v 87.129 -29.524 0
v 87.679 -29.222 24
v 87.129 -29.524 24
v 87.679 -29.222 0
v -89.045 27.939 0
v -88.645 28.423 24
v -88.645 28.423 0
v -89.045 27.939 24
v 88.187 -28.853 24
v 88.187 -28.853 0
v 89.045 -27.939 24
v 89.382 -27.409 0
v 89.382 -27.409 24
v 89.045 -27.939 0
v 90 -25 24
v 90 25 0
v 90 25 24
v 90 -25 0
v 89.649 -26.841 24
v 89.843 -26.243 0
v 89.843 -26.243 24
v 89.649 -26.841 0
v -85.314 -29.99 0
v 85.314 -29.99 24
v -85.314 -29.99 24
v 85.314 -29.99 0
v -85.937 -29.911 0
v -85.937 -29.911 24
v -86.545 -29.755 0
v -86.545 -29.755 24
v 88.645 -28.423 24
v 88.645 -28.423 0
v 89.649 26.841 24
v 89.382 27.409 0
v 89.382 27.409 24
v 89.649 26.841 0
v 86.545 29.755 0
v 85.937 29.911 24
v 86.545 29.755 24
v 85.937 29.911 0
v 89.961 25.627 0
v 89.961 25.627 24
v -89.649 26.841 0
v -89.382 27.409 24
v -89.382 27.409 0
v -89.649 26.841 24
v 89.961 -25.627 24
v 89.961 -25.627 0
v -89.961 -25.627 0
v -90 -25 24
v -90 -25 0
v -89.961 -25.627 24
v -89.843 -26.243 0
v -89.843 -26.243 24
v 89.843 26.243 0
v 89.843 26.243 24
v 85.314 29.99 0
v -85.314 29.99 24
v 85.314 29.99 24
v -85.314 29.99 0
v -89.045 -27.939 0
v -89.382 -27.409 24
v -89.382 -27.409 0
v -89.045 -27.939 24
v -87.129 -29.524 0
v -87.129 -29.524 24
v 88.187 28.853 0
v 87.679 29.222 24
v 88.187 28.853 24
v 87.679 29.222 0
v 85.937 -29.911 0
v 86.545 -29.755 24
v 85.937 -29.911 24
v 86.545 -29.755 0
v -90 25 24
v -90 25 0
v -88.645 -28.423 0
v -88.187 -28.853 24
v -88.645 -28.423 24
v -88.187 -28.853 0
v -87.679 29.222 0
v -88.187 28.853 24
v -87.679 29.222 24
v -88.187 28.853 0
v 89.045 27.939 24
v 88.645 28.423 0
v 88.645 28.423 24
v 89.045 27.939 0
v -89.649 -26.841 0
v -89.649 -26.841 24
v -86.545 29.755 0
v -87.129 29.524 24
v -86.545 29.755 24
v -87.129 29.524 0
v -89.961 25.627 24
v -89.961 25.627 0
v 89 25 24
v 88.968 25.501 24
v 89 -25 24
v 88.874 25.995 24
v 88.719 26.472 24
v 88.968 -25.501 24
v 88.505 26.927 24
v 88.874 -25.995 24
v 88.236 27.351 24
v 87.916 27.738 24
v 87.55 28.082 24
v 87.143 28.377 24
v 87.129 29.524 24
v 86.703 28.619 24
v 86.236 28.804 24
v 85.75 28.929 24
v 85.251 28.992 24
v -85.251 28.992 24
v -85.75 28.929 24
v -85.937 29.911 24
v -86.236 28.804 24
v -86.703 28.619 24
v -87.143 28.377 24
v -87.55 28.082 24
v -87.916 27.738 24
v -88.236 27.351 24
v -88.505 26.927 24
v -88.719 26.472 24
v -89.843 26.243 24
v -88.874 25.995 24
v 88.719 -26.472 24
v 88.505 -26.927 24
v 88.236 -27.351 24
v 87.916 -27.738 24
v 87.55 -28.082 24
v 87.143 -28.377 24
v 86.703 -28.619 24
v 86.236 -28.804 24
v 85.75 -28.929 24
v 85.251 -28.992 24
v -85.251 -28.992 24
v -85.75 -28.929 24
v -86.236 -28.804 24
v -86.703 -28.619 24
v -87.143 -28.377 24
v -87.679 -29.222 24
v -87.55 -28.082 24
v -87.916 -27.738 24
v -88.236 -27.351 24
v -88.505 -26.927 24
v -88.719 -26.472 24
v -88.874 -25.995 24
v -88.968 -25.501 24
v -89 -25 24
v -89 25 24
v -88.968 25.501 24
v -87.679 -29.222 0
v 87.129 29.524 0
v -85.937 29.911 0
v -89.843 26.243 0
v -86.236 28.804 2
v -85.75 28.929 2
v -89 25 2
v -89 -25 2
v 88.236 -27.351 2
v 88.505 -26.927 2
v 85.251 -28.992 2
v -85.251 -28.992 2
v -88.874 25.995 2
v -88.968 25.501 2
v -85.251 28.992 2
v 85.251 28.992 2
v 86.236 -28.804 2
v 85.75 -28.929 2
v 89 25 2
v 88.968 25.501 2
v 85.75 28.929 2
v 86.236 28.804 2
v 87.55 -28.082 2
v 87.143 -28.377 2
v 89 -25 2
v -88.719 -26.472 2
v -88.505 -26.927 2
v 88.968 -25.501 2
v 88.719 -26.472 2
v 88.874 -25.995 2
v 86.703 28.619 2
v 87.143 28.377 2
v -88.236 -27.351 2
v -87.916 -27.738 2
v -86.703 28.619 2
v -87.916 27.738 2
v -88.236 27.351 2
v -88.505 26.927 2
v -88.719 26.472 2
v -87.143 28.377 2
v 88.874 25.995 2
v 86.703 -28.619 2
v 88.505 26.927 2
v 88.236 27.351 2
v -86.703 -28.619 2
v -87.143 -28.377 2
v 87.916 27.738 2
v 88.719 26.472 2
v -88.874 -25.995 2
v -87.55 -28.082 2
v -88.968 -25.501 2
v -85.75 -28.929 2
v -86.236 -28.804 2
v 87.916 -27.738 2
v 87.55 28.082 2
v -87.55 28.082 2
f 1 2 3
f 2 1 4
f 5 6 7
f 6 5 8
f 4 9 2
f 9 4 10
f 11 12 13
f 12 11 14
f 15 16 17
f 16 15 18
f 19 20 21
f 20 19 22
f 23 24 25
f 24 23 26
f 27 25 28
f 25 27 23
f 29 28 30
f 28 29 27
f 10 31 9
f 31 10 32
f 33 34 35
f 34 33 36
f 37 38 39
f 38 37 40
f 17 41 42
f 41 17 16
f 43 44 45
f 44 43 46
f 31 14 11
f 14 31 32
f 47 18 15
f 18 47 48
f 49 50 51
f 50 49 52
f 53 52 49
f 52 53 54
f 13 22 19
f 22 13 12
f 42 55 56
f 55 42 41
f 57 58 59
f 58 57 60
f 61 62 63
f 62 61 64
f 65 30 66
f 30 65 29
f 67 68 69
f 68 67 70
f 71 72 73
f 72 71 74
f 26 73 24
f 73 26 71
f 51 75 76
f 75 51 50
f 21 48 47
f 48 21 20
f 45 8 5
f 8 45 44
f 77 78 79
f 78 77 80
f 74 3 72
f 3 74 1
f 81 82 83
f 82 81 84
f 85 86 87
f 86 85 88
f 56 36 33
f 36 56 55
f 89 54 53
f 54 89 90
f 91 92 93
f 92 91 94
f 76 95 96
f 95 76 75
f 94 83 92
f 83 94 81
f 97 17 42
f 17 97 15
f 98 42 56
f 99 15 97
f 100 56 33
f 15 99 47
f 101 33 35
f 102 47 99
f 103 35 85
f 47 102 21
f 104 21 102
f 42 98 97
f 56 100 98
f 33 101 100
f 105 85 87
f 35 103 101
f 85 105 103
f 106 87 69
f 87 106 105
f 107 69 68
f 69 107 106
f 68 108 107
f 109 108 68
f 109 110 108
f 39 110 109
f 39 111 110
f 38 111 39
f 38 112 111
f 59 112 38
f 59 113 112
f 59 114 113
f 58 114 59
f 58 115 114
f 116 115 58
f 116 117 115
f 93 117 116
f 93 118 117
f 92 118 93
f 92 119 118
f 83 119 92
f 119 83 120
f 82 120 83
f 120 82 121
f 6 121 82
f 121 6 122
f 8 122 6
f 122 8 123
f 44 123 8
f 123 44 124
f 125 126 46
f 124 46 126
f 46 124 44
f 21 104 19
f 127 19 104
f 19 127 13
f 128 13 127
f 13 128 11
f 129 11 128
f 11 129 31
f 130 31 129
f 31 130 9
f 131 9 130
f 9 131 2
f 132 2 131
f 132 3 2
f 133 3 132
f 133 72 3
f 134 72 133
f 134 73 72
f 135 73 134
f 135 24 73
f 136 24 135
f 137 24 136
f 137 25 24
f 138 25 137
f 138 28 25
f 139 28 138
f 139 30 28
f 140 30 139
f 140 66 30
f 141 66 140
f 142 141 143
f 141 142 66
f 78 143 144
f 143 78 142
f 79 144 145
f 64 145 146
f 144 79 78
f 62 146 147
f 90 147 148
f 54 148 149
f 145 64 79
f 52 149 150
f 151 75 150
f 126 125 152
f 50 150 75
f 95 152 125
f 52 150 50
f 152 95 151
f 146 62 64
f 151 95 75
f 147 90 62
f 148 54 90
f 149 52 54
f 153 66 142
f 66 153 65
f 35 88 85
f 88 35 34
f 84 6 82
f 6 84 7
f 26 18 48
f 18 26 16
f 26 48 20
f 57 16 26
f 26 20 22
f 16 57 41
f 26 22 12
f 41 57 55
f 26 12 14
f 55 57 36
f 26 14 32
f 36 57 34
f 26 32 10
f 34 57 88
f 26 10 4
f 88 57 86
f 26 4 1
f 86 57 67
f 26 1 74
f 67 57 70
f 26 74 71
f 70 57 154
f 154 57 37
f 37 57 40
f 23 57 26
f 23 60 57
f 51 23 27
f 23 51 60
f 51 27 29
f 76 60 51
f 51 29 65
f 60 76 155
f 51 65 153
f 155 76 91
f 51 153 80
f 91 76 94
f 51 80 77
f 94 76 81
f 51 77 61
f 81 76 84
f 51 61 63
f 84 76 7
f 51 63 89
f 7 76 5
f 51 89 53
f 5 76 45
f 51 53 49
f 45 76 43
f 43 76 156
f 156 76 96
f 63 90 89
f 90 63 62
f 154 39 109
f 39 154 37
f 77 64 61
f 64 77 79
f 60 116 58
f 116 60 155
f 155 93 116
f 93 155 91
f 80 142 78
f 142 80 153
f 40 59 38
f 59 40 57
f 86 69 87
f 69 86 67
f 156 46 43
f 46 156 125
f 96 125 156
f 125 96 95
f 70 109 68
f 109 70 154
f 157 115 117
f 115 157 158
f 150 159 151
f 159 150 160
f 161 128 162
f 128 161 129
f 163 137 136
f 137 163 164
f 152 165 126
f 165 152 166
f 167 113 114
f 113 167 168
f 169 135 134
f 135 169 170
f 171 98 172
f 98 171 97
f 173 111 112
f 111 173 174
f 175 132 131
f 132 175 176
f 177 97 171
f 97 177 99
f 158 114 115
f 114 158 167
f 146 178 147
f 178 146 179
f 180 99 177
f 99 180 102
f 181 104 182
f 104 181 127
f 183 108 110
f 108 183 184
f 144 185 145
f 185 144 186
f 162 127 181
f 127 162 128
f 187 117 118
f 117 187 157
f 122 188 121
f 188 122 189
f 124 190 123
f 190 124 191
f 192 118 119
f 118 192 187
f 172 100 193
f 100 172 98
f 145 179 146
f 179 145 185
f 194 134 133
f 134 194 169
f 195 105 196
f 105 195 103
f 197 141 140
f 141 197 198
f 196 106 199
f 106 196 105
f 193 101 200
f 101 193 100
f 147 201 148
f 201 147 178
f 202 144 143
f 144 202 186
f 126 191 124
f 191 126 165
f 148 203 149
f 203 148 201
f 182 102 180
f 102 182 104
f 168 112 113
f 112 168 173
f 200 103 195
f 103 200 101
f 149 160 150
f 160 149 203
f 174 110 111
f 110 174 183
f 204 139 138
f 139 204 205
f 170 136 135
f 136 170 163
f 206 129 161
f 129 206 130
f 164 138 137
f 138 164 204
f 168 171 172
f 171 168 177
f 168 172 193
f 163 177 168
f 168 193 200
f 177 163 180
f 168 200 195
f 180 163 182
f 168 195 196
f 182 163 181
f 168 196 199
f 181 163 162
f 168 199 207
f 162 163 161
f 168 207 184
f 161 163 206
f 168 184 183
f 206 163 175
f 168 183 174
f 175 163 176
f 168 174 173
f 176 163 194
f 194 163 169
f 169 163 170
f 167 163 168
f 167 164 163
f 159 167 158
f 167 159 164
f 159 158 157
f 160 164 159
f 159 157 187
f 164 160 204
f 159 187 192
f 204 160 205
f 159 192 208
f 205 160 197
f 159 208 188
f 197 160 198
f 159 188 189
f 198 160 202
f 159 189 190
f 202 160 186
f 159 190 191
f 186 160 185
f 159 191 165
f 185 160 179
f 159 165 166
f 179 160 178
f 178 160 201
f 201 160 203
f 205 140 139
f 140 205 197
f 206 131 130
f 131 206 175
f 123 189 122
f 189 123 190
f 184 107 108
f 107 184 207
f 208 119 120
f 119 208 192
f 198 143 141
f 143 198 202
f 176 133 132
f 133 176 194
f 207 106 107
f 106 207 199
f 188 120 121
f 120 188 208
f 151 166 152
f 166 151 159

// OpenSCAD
$fn = 50;


difference() {
	union() {
		hull() {
			translate(v = [-85.0000000000, 25.0000000000, 0]) {
				cylinder(h = 24, r = 5);
			}
			translate(v = [85.0000000000, 25.0000000000, 0]) {
				cylinder(h = 24, r = 5);
			}
			translate(v = [-85.0000000000, -25.0000000000, 0]) {
				cylinder(h = 24, r = 5);
			}
			translate(v = [85.0000000000, -25.0000000000, 0]) {
				cylinder(h = 24, r = 5);
			}
		}
	}
	union() {
		translate(v = [0, 0, 2]) {
			hull() {
				translate(v = [-85.0000000000, 25.0000000000, 0]) {
					cylinder(h = 22, r = 4);
				}
				translate(v = [85.0000000000, 25.0000000000, 0]) {
					cylinder(h = 22, r = 4);
				}
				translate(v = [-85.0000000000, -25.0000000000, 0]) {
					cylinder(h = 22, r = 4);
				}
				translate(v = [85.0000000000, -25.0000000000, 0]) {
					cylinder(h = 22, r = 4);
				}
			}
		}
	}
}
